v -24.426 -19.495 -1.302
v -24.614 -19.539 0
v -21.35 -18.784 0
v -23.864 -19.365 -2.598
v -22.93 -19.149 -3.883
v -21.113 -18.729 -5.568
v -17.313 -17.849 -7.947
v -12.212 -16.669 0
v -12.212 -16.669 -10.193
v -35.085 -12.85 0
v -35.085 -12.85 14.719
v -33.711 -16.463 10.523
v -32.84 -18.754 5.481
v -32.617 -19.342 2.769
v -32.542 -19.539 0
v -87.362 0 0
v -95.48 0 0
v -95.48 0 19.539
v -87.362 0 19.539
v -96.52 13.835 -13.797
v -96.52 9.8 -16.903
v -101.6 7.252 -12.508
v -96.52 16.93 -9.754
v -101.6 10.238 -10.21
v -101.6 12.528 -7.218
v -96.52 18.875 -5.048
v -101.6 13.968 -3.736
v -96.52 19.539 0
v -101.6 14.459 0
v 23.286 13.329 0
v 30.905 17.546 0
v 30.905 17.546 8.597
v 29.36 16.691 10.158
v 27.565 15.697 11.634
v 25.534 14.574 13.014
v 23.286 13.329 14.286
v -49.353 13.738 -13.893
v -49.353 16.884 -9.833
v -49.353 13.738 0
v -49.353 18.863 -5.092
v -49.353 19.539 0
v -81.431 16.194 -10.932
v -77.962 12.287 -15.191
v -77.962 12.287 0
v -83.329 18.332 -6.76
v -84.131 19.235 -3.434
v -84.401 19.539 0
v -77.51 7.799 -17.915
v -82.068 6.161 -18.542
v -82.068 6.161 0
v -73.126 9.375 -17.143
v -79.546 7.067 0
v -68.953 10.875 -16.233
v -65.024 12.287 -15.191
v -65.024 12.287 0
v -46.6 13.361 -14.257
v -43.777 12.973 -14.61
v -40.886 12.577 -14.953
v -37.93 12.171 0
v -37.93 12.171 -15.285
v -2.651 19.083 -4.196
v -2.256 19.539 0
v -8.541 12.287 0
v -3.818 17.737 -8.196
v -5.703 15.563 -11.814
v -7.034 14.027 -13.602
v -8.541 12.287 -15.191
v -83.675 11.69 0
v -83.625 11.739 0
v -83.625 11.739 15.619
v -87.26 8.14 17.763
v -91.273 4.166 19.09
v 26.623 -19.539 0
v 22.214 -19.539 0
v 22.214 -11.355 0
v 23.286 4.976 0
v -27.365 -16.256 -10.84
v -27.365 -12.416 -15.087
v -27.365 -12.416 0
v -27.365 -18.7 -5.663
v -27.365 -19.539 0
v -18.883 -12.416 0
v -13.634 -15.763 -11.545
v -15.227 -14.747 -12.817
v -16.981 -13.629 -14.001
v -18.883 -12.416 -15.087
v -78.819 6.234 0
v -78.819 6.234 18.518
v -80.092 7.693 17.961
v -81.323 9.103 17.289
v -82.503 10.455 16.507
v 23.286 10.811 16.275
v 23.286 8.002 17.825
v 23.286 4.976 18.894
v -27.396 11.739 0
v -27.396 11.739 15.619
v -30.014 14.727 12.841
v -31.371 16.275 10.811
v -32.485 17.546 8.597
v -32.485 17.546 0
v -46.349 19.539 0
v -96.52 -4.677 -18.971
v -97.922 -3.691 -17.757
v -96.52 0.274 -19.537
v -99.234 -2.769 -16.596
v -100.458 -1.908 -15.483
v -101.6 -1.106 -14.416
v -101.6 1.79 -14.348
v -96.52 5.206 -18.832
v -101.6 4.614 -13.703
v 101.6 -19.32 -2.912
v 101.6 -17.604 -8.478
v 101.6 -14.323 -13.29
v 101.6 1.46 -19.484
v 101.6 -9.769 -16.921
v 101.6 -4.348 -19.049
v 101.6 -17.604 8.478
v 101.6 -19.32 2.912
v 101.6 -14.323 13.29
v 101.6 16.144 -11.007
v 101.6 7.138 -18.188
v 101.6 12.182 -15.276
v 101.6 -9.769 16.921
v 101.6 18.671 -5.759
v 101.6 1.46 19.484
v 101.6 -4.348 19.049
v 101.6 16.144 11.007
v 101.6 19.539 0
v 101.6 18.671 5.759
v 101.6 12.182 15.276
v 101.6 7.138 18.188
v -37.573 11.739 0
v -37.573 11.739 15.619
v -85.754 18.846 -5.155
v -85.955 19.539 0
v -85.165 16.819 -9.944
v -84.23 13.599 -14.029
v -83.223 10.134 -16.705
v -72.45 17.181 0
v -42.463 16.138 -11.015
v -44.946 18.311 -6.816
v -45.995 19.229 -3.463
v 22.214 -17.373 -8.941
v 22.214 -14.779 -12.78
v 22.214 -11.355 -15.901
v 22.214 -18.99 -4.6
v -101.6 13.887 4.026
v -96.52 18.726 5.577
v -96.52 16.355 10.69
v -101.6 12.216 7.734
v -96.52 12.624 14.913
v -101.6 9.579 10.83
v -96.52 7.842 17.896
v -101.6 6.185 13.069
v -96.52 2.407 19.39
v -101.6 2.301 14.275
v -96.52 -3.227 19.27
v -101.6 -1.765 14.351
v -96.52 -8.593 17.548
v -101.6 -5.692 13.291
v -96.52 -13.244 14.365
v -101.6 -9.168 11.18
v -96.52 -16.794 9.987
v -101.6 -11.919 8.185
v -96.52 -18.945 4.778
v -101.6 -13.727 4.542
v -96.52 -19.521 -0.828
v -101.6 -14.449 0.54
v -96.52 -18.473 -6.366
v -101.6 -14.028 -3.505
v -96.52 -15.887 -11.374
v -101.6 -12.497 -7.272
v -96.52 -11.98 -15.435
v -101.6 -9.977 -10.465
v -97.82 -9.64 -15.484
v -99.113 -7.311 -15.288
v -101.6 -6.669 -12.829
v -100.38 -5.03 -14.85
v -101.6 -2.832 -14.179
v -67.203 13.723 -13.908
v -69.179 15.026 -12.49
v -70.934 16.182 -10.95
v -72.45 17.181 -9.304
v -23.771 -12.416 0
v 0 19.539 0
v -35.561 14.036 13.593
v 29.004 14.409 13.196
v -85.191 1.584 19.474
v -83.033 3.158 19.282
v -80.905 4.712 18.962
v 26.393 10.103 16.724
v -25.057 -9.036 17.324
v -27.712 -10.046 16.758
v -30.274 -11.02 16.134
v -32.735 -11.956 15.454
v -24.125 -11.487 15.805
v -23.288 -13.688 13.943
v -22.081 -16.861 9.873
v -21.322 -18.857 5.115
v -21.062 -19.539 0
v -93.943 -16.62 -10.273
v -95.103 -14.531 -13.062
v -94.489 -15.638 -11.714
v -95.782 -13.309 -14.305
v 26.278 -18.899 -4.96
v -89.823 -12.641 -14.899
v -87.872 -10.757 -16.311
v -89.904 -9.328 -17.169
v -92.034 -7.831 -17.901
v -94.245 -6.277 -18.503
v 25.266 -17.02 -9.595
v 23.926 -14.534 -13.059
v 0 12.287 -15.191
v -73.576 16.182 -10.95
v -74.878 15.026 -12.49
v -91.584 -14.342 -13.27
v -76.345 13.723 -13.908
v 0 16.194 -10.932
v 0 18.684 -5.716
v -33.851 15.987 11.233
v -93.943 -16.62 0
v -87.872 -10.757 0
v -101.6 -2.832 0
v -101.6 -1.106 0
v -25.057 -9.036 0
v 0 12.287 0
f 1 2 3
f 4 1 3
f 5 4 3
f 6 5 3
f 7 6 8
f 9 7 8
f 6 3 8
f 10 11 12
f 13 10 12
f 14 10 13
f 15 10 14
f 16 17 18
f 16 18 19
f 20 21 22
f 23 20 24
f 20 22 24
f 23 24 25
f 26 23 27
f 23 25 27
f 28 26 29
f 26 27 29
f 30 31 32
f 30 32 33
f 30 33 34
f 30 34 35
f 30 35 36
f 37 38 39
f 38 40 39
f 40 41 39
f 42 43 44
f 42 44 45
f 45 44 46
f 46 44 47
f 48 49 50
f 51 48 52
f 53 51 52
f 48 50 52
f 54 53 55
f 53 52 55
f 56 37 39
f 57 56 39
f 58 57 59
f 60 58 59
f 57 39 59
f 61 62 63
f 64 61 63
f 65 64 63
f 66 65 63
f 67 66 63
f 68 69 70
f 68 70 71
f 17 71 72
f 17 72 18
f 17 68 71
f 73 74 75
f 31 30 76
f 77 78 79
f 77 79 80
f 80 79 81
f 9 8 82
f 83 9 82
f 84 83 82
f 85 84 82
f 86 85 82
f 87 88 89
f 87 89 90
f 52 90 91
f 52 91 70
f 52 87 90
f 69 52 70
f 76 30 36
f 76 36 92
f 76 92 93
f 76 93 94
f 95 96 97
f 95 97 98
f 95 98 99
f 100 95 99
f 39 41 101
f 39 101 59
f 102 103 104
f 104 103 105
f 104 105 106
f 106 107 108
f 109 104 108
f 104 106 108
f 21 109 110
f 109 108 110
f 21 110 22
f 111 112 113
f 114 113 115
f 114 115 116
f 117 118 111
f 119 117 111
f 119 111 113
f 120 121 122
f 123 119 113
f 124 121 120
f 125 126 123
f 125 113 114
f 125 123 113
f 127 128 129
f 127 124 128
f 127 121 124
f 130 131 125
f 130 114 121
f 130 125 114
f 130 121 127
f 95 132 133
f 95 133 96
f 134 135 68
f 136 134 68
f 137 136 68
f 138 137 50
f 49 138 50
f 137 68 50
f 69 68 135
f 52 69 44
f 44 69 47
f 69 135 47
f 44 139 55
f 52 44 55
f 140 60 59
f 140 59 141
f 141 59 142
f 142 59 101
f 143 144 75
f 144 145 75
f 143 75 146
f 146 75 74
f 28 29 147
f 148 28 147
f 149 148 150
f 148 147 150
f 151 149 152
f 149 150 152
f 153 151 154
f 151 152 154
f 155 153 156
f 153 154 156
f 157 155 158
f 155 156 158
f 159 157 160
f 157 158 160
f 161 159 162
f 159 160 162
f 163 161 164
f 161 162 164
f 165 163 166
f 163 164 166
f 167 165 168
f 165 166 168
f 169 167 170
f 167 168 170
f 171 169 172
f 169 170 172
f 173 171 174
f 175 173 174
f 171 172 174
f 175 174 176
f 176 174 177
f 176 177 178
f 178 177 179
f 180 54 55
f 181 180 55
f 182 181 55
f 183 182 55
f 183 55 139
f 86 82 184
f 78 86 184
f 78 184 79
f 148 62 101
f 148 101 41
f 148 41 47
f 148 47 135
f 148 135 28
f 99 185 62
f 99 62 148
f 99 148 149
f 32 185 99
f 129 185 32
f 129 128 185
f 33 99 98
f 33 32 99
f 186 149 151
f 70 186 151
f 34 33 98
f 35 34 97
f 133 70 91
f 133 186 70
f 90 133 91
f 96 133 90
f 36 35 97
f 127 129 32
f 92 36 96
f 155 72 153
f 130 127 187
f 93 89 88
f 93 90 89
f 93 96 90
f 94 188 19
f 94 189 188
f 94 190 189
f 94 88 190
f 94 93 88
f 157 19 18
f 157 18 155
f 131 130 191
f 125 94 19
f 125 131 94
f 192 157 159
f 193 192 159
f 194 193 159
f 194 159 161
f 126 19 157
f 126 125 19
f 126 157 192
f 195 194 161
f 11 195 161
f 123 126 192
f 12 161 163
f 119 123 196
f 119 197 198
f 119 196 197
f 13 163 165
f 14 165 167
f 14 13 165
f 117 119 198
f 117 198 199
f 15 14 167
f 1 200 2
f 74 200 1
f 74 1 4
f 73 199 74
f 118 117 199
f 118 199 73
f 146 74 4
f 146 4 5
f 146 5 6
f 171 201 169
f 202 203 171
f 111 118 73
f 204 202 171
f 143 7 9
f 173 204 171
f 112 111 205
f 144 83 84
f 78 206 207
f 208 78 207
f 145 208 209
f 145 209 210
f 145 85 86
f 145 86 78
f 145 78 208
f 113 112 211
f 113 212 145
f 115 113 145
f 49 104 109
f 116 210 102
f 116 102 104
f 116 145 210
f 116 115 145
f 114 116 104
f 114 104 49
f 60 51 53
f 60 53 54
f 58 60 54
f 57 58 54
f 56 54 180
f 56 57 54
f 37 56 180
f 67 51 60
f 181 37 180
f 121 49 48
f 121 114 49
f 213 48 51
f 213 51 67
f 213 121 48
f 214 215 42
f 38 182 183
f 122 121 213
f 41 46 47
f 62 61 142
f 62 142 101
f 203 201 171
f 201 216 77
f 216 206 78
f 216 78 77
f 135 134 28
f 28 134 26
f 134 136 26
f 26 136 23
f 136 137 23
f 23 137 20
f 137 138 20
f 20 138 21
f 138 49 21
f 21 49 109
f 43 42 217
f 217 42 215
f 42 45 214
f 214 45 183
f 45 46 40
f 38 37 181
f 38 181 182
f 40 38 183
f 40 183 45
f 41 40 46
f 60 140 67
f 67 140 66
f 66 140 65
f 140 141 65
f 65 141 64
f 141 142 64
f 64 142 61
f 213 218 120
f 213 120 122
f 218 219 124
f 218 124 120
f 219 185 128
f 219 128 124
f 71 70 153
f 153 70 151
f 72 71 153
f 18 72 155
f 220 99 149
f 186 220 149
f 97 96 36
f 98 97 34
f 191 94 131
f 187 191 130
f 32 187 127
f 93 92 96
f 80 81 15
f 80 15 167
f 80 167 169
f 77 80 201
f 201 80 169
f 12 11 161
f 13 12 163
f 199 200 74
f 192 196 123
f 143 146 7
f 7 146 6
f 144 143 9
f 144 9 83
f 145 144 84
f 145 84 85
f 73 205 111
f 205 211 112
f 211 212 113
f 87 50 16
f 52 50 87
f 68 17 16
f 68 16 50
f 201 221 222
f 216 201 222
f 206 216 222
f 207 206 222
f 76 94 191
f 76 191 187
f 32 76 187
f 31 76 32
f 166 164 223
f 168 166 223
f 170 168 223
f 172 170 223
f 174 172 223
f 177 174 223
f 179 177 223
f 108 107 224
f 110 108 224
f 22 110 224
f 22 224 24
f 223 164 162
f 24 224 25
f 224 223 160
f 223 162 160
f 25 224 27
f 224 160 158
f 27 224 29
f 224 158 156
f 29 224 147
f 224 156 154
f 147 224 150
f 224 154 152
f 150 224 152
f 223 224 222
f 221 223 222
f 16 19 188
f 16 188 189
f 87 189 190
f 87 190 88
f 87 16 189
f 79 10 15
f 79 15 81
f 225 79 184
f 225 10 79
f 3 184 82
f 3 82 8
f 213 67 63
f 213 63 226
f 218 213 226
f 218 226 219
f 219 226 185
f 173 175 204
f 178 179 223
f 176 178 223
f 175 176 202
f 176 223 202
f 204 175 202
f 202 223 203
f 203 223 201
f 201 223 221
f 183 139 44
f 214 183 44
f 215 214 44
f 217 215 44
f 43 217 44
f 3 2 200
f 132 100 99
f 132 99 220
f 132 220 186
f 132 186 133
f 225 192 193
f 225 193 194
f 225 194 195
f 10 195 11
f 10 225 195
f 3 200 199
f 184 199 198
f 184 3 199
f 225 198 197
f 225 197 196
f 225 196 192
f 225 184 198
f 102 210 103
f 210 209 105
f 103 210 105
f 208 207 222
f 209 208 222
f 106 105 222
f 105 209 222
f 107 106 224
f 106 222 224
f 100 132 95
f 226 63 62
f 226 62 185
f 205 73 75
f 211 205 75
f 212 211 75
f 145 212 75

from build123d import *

# Parameters (mm, degrees)
F0_R        = 19.5387268204
F1_DEPTH    = 101.6
F3_DEPTH    = 38.1
F5_DEPTH    = 25.4
F7_DEPTH    = 25.4
F8_T2_ANGLE = 300.1049055837
F8_T4_ANGLE = 131.5703123603


# Not quite as in the source:
# - a fillet or chamfer that OpenCascade refuses, or shapes differently, is made with other operations: its cross-section is extruded or revolved along the edge and cut away or added


with BuildPart() as f1:
    # F0 (on Right) → F1 (new body, symmetric)
    with BuildSketch(Plane.YZ):
        Circle(F0_R)
    extrude(amount=F1_DEPTH, both=True)

    # F2 (on Top) → F3 (cut)
    with BuildSketch(Plane.XY):
        Polygon((-49.3527501822, 13.7382084504), (-37.9295572639, 12.1708353981), (-49.3527501822, 22.1678428352), align=None)
    extrude(amount=-F3_DEPTH, mode=Mode.SUBTRACT)

    # F4 (on Top) → F5 (cut)
    with BuildSketch(Plane.XY):
        Polygon((-103.1729057431, 0), (-93.9432457089, -16.6200213134), (-87.8715068102, -10.7566714287), align=None)
        Polygon((22.2135502845, -11.3549903035), (22.2135502845, -20.1754160225), (26.9660595804, -20.1754160225), align=None)
        Polygon((-77.9622271657, 12.2874397784), (-86.7114588618, 22.1413038671), (-82.0683091879, 6.1605265364), (-65.0239139795, 12.2874397784), (-72.4504972355, 17.1812968249), align=None)
        Polygon((0, 22.1413038671), (-8.541457355, 12.2874397784), (0, 12.2874397784), align=None)
        Polygon((-27.3653976619, -12.4159986153), (-27.3653976619, -20.1754160225), (-12.2119756415, -16.6692733765), (-18.8832655549, -12.4159986153), align=None)
    extrude(amount=-F5_DEPTH, mode=Mode.SUBTRACT)

    # F6 (on Top) → F7 (cut)
    with BuildSketch(Plane.XY):
        Polygon((-32.052900187, -20.8235712349), (-20.0643315911, -22.1631750464), (-25.0567086041, -9.0359868482), (-35.0853319095, -12.8499542954), align=None)
        Polygon((23.2855007052, 4.9763009883), (30.9053044766, 17.5455939025), (23.2855007052, 13.3292628452), align=None)
        Polygon((-78.8187682629, 6.2337135896), (-83.6249142885, 11.739499867), (-95.4798087478, 0), (-87.3620659113, 0), align=None)
        Polygon((-32.4846748263, 17.5455939025), (-37.5734344125, 11.739499867), (-27.39591524, 11.739499867), align=None)
    extrude(amount=F7_DEPTH, mode=Mode.SUBTRACT)

    # F8: chamfer of 5.08 on 1 edges, made by hand

    # F8_s1 → F8_t2 (revolve, cut)
    with BuildSketch(Plane.XY):
        Polygon((-96.52, 19.5387268204), (-101.6, 14.4587268204), (-101.6, 19.5387268204), align=None)
    revolve(axis=Axis((-101.6, 0, 0), (1, 0, 0)), revolution_arc=F8_T2_ANGLE, mode=Mode.SUBTRACT)

    # F8_s3 → F8_t4 (revolve, cut)
    with BuildSketch(Plane(origin=(0, 0, 0), x_dir=(1, 0, 0), z_dir=(0, -0.7481420015, 0.6635386542))):
        Polygon((-96.52, -19.5387268204), (-101.6, -14.4587268204), (-101.6, -19.5387268204), align=None)
    revolve(axis=Axis((-101.6, 0, 0), (1, 0, 0)), revolution_arc=F8_T4_ANGLE, mode=Mode.SUBTRACT)


solid = f1.part
